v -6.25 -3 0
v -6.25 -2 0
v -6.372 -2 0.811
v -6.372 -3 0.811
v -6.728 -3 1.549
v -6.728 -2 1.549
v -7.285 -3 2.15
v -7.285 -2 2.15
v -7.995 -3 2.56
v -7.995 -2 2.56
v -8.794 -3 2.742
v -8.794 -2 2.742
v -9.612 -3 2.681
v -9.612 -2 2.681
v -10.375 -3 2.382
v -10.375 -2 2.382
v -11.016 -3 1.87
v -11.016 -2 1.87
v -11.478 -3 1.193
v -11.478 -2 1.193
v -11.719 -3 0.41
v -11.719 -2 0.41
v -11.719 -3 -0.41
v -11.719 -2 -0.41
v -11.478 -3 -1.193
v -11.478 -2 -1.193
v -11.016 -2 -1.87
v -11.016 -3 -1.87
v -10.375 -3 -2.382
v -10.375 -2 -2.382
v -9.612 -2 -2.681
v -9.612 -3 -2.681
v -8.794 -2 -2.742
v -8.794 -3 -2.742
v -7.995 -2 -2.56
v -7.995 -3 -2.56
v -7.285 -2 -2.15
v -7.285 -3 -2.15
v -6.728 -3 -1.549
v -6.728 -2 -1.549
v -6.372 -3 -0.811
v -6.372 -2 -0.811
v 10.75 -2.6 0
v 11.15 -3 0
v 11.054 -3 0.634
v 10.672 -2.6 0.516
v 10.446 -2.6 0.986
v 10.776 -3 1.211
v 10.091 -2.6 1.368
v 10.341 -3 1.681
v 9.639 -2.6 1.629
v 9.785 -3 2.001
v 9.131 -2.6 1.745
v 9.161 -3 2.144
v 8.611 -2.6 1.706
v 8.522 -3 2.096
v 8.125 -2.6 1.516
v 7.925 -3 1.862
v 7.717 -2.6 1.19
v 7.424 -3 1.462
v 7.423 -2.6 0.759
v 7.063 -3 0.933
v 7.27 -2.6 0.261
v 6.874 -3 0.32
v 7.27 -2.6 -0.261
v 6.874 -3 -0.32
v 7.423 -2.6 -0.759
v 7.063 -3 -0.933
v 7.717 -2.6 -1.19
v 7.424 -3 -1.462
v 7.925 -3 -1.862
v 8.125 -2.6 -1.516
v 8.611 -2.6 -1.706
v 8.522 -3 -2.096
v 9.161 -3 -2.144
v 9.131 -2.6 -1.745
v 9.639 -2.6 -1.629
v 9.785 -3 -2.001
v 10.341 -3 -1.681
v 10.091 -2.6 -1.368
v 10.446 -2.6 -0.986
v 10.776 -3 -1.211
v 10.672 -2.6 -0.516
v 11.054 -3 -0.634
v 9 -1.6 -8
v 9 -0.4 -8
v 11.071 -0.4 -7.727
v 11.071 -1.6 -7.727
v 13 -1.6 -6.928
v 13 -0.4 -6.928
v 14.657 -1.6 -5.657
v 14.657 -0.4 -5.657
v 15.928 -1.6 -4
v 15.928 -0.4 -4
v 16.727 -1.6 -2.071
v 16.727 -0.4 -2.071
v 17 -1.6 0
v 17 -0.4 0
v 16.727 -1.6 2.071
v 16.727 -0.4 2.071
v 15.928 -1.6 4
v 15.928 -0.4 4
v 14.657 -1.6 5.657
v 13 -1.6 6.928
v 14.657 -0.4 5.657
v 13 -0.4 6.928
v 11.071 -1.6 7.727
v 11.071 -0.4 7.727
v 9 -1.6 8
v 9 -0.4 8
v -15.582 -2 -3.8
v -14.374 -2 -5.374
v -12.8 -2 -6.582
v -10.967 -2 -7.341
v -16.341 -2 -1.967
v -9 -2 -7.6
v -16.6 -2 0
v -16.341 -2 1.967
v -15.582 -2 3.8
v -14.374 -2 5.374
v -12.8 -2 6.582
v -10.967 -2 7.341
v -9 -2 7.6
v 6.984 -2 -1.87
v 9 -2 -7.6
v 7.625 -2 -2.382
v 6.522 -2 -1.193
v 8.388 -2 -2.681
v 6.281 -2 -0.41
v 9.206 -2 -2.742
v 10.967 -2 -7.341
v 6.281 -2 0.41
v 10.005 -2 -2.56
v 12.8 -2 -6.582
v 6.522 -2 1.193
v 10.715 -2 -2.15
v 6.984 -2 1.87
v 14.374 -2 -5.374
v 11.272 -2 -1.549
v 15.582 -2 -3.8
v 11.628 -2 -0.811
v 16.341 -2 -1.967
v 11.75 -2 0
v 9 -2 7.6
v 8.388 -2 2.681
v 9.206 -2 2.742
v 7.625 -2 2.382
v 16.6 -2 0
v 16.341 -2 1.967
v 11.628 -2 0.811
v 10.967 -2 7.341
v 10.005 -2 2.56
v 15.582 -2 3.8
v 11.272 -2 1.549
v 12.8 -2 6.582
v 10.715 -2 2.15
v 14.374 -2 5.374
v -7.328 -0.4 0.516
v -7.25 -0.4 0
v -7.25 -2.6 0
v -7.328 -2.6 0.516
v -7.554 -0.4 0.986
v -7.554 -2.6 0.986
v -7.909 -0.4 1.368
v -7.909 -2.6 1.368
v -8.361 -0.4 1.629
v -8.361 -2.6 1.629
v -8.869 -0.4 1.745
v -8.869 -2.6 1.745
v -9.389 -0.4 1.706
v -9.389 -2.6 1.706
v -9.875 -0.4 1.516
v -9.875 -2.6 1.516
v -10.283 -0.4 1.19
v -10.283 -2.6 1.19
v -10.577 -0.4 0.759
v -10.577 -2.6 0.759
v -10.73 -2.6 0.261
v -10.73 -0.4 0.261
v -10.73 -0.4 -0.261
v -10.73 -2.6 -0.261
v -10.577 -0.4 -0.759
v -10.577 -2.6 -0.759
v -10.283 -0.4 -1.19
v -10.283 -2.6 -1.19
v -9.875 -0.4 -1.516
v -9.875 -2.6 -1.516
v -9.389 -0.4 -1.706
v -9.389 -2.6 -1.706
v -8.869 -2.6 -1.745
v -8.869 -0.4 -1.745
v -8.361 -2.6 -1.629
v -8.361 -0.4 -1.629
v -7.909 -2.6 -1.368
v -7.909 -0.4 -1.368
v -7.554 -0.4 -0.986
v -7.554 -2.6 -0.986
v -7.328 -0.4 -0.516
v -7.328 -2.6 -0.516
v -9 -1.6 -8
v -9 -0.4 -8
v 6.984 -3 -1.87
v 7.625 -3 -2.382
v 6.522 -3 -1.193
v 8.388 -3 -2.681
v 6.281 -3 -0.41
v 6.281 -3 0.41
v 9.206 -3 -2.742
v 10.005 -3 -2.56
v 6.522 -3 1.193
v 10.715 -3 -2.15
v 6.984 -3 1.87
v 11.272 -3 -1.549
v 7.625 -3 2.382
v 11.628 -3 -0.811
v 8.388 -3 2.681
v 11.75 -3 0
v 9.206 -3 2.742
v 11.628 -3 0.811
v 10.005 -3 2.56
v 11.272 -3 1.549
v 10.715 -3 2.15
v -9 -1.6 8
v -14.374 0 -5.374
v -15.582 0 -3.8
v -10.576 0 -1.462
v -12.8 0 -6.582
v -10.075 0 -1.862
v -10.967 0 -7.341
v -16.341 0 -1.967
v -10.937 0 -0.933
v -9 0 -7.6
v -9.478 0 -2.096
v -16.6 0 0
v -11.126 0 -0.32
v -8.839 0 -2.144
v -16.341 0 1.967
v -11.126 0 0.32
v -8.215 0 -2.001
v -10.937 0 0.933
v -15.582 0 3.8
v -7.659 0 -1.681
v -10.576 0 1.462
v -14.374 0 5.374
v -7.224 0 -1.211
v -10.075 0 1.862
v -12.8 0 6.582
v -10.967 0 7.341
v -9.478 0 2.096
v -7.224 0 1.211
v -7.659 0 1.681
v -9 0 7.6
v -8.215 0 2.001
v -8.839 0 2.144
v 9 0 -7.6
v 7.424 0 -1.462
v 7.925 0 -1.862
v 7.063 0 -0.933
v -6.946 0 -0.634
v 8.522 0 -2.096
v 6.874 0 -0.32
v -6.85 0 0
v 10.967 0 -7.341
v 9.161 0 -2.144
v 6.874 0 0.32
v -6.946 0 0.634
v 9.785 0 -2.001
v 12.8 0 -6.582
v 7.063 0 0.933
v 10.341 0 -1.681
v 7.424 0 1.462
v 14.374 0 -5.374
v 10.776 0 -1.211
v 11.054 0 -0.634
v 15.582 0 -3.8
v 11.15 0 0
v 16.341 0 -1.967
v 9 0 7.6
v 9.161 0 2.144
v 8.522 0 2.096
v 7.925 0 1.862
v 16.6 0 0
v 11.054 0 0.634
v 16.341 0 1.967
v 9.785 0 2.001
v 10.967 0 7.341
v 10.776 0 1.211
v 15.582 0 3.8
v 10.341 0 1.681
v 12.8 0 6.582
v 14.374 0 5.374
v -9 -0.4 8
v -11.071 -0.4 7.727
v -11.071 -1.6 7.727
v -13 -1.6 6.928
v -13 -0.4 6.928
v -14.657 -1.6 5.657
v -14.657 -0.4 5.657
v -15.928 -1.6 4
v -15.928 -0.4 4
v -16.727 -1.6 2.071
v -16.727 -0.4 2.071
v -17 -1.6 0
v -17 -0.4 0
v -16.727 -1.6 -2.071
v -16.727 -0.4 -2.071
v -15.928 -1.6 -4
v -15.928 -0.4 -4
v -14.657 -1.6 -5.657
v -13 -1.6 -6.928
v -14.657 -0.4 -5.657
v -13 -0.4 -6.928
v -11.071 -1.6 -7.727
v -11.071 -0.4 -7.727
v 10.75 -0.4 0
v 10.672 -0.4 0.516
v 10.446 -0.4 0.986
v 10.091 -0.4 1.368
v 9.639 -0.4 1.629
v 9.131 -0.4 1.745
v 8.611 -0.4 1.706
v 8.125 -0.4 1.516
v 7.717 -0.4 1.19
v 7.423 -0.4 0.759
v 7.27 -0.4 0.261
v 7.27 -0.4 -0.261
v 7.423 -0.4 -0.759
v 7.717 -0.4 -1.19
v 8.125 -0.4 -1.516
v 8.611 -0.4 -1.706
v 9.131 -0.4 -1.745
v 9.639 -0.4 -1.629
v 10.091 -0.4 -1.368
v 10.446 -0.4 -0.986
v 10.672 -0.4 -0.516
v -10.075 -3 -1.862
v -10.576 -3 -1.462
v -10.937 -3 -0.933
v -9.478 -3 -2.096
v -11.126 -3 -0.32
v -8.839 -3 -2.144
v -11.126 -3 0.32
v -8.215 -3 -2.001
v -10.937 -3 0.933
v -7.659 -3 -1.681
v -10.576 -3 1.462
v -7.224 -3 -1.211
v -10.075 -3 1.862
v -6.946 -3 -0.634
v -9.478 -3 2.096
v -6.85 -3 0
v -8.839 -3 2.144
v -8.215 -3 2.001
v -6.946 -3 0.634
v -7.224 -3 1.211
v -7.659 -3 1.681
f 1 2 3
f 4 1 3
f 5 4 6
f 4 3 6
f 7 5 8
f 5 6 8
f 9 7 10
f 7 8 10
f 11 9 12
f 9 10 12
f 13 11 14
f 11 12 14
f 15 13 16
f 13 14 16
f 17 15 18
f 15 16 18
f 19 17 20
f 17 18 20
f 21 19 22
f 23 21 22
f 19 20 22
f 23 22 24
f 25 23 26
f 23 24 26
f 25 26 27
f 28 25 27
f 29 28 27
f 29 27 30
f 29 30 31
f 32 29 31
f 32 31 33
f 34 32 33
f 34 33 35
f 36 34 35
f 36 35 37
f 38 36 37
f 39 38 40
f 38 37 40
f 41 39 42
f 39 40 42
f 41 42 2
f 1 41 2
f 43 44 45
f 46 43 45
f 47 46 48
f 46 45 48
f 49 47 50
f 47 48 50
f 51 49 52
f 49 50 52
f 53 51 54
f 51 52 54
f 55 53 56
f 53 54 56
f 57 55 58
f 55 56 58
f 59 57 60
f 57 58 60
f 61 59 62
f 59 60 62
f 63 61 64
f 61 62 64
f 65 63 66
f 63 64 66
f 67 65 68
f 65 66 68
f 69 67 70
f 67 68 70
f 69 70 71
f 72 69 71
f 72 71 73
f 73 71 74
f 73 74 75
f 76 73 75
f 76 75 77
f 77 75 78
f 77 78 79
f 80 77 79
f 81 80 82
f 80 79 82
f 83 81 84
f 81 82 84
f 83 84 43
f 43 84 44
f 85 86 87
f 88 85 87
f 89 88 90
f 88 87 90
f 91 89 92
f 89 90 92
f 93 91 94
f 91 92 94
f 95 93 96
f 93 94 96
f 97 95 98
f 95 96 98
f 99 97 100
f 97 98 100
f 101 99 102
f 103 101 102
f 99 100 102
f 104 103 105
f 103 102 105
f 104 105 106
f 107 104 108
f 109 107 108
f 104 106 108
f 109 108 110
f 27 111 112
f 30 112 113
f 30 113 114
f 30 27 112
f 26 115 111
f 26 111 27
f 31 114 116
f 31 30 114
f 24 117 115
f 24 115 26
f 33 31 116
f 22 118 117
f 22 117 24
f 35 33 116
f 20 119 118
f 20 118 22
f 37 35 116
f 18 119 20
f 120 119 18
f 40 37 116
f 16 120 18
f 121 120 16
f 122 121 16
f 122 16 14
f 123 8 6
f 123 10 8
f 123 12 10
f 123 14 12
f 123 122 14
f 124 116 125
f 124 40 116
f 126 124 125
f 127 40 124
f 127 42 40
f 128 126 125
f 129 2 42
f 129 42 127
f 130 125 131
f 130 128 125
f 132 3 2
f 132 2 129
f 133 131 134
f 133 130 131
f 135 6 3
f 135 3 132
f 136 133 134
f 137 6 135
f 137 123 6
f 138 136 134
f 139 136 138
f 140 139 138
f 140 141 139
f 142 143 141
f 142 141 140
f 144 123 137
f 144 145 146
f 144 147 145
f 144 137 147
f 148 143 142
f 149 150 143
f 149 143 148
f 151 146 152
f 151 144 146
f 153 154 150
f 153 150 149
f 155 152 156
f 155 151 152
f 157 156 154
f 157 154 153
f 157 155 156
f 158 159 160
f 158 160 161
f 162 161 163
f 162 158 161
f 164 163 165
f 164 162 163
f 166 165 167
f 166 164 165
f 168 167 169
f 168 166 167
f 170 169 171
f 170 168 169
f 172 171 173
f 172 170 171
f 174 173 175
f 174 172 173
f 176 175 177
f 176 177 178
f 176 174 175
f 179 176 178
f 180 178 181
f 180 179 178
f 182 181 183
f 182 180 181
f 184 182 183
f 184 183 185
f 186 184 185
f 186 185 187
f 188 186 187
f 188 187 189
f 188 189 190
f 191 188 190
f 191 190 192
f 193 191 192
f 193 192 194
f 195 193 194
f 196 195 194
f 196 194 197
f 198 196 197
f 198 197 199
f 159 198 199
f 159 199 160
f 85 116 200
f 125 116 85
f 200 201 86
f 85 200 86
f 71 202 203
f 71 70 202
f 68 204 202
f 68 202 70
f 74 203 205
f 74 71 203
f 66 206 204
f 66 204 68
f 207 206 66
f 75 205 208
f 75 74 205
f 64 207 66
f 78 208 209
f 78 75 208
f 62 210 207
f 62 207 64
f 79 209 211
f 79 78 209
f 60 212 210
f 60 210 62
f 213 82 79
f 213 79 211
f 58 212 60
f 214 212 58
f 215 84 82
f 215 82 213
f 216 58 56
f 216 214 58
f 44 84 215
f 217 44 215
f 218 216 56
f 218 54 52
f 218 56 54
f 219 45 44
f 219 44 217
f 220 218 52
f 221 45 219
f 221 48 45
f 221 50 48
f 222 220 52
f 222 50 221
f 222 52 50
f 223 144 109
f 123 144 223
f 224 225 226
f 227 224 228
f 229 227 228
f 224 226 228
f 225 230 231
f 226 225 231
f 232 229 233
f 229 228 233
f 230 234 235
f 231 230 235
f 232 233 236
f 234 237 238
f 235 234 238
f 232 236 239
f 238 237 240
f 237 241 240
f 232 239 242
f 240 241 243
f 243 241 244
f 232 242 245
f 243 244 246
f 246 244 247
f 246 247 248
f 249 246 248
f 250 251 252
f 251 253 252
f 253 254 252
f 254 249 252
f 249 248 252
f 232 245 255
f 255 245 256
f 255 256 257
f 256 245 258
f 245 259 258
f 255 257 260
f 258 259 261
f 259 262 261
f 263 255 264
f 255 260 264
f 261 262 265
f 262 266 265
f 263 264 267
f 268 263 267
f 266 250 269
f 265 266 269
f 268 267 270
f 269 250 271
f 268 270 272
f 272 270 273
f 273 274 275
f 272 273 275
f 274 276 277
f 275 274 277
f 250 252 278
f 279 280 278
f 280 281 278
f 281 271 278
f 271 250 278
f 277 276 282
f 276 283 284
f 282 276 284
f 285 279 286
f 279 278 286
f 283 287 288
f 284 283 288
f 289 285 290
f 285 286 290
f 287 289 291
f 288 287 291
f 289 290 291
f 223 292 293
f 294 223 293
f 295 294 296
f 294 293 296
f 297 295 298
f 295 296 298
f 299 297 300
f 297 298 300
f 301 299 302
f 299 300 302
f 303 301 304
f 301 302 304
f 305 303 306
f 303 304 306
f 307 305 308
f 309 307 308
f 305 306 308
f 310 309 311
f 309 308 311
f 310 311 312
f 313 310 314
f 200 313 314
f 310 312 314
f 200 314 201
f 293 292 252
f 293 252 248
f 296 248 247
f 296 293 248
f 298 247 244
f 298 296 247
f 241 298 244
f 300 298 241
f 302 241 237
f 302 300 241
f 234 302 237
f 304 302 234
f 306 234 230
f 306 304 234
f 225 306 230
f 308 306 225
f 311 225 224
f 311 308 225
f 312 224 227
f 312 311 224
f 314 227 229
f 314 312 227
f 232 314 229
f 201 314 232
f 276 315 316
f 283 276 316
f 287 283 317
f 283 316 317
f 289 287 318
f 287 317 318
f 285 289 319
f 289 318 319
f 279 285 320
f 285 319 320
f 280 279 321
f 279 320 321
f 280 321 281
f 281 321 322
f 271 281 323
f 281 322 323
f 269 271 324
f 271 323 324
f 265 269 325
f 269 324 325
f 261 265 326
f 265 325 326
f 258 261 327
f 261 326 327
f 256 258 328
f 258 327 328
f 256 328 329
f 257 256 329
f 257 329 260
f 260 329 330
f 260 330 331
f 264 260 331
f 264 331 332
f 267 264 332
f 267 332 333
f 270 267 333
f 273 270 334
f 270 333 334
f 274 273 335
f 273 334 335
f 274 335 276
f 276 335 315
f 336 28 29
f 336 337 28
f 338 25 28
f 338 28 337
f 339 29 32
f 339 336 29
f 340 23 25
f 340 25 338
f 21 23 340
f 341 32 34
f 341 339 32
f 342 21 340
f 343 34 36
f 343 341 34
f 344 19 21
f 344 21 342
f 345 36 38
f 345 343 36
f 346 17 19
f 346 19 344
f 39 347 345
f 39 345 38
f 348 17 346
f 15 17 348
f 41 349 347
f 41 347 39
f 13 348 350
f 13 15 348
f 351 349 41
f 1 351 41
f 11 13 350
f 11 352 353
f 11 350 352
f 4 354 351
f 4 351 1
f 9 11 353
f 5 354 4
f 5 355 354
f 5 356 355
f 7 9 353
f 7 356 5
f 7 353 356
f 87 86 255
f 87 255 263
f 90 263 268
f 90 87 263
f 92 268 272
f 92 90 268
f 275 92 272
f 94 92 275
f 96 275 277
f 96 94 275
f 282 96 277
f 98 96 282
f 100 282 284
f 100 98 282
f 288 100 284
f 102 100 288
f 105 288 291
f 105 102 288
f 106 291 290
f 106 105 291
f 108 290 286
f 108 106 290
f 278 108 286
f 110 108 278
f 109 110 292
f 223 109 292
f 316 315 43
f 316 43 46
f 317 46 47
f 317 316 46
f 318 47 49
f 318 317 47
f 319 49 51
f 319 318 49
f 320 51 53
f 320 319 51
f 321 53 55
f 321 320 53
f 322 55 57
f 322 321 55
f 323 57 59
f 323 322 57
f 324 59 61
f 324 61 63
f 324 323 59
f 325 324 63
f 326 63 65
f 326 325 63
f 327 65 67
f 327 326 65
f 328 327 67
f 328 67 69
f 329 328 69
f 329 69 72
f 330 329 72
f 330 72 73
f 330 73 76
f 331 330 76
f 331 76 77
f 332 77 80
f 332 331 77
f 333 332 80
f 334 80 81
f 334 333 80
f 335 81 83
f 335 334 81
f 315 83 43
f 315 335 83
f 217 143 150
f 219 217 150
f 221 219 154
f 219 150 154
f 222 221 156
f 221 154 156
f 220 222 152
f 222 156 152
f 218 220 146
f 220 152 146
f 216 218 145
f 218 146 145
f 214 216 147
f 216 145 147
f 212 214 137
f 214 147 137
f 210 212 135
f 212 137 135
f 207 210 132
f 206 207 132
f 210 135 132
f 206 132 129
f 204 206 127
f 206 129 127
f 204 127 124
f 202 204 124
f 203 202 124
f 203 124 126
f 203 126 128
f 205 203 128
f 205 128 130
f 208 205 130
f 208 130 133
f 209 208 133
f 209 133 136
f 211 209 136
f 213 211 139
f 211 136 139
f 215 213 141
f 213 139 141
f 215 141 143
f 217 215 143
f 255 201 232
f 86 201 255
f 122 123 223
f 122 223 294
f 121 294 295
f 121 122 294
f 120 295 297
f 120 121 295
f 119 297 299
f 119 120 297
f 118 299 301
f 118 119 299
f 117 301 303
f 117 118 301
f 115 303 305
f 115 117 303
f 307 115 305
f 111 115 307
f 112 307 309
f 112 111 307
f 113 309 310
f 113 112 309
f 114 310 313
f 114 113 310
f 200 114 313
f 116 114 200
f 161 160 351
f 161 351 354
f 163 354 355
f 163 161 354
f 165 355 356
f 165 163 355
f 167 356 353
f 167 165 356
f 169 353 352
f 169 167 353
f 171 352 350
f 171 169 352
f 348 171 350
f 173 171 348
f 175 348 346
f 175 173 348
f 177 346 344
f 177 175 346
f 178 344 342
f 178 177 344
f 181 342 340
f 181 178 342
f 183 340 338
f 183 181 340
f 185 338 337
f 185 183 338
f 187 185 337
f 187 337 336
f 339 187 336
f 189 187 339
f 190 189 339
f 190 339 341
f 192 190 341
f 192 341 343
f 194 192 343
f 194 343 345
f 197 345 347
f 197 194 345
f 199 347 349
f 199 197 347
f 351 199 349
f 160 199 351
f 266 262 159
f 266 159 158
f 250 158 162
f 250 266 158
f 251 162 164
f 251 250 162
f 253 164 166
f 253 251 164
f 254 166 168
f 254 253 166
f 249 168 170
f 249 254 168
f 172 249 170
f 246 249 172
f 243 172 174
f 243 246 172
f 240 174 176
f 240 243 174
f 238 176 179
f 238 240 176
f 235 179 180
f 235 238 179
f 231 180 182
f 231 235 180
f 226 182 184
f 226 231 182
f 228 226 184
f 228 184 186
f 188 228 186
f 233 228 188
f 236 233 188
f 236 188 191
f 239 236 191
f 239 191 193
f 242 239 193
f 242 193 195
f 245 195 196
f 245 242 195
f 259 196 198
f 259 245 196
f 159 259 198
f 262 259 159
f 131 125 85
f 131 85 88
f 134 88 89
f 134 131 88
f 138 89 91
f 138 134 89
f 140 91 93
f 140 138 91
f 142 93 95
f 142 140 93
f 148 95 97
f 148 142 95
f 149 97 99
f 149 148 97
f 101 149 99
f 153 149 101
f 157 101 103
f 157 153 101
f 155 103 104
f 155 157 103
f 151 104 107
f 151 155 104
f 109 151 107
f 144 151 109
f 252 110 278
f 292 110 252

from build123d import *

# Parameters (mm, degrees)
F0_R     = 1.75
F1_DEPTH = 2
F2_R     = 2.75
F2_R_2   = 1.75
F3_DEPTH = 1
F4_SIZE  = 0.4


with BuildPart() as f1:
    # F0 (on Front) → F1 (new body)
    with BuildSketch(Plane.XZ):
        with BuildLine():
            ThreePointArc((-9, 8), (-17, 0), (-9, -8))
            Line((-9, -8), (9, -8))
            ThreePointArc((9, -8), (17, 0), (9, 8))
            Line((9, 8), (-9, 8))
        make_face()
        with Locations((-9, 0)):
            Circle(F0_R, mode=Mode.SUBTRACT)
        with Locations((9, 0)):
            Circle(F0_R, mode=Mode.SUBTRACT)
    extrude(amount=F1_DEPTH)

    # F2 (on face) → F3 (join)
    with BuildSketch(Plane.XZ.offset(2)):
        with Locations((-9, 0)):
            Circle(F2_R)
        with Locations((-9, 0)):
            Circle(F2_R_2, mode=Mode.SUBTRACT)
        with Locations((9, 0)):
            Circle(F2_R)
        with Locations((9, 0)):
            Circle(F2_R_2, mode=Mode.SUBTRACT)
    extrude(amount=F3_DEPTH)

    # F4
    f4_edges = [f1.edges().sort_by_distance(p)[0] for p in [
        (-17, -2, 0),
        (0, -2, -8),
        (0, -2, 8),
        (17, -2, 0),
        (0, 0, 8),
        (-17, 0, 0),
        (0, 0, -8),
        (17, 0, 0),
        (-10.75, 0, 0),
        (7.25, 0, 0),
        (-10.75, -3, 0),
        (7.25, -3, 0),
    ]]
    chamfer(f4_edges, length=F4_SIZE)


solid = f1.part
